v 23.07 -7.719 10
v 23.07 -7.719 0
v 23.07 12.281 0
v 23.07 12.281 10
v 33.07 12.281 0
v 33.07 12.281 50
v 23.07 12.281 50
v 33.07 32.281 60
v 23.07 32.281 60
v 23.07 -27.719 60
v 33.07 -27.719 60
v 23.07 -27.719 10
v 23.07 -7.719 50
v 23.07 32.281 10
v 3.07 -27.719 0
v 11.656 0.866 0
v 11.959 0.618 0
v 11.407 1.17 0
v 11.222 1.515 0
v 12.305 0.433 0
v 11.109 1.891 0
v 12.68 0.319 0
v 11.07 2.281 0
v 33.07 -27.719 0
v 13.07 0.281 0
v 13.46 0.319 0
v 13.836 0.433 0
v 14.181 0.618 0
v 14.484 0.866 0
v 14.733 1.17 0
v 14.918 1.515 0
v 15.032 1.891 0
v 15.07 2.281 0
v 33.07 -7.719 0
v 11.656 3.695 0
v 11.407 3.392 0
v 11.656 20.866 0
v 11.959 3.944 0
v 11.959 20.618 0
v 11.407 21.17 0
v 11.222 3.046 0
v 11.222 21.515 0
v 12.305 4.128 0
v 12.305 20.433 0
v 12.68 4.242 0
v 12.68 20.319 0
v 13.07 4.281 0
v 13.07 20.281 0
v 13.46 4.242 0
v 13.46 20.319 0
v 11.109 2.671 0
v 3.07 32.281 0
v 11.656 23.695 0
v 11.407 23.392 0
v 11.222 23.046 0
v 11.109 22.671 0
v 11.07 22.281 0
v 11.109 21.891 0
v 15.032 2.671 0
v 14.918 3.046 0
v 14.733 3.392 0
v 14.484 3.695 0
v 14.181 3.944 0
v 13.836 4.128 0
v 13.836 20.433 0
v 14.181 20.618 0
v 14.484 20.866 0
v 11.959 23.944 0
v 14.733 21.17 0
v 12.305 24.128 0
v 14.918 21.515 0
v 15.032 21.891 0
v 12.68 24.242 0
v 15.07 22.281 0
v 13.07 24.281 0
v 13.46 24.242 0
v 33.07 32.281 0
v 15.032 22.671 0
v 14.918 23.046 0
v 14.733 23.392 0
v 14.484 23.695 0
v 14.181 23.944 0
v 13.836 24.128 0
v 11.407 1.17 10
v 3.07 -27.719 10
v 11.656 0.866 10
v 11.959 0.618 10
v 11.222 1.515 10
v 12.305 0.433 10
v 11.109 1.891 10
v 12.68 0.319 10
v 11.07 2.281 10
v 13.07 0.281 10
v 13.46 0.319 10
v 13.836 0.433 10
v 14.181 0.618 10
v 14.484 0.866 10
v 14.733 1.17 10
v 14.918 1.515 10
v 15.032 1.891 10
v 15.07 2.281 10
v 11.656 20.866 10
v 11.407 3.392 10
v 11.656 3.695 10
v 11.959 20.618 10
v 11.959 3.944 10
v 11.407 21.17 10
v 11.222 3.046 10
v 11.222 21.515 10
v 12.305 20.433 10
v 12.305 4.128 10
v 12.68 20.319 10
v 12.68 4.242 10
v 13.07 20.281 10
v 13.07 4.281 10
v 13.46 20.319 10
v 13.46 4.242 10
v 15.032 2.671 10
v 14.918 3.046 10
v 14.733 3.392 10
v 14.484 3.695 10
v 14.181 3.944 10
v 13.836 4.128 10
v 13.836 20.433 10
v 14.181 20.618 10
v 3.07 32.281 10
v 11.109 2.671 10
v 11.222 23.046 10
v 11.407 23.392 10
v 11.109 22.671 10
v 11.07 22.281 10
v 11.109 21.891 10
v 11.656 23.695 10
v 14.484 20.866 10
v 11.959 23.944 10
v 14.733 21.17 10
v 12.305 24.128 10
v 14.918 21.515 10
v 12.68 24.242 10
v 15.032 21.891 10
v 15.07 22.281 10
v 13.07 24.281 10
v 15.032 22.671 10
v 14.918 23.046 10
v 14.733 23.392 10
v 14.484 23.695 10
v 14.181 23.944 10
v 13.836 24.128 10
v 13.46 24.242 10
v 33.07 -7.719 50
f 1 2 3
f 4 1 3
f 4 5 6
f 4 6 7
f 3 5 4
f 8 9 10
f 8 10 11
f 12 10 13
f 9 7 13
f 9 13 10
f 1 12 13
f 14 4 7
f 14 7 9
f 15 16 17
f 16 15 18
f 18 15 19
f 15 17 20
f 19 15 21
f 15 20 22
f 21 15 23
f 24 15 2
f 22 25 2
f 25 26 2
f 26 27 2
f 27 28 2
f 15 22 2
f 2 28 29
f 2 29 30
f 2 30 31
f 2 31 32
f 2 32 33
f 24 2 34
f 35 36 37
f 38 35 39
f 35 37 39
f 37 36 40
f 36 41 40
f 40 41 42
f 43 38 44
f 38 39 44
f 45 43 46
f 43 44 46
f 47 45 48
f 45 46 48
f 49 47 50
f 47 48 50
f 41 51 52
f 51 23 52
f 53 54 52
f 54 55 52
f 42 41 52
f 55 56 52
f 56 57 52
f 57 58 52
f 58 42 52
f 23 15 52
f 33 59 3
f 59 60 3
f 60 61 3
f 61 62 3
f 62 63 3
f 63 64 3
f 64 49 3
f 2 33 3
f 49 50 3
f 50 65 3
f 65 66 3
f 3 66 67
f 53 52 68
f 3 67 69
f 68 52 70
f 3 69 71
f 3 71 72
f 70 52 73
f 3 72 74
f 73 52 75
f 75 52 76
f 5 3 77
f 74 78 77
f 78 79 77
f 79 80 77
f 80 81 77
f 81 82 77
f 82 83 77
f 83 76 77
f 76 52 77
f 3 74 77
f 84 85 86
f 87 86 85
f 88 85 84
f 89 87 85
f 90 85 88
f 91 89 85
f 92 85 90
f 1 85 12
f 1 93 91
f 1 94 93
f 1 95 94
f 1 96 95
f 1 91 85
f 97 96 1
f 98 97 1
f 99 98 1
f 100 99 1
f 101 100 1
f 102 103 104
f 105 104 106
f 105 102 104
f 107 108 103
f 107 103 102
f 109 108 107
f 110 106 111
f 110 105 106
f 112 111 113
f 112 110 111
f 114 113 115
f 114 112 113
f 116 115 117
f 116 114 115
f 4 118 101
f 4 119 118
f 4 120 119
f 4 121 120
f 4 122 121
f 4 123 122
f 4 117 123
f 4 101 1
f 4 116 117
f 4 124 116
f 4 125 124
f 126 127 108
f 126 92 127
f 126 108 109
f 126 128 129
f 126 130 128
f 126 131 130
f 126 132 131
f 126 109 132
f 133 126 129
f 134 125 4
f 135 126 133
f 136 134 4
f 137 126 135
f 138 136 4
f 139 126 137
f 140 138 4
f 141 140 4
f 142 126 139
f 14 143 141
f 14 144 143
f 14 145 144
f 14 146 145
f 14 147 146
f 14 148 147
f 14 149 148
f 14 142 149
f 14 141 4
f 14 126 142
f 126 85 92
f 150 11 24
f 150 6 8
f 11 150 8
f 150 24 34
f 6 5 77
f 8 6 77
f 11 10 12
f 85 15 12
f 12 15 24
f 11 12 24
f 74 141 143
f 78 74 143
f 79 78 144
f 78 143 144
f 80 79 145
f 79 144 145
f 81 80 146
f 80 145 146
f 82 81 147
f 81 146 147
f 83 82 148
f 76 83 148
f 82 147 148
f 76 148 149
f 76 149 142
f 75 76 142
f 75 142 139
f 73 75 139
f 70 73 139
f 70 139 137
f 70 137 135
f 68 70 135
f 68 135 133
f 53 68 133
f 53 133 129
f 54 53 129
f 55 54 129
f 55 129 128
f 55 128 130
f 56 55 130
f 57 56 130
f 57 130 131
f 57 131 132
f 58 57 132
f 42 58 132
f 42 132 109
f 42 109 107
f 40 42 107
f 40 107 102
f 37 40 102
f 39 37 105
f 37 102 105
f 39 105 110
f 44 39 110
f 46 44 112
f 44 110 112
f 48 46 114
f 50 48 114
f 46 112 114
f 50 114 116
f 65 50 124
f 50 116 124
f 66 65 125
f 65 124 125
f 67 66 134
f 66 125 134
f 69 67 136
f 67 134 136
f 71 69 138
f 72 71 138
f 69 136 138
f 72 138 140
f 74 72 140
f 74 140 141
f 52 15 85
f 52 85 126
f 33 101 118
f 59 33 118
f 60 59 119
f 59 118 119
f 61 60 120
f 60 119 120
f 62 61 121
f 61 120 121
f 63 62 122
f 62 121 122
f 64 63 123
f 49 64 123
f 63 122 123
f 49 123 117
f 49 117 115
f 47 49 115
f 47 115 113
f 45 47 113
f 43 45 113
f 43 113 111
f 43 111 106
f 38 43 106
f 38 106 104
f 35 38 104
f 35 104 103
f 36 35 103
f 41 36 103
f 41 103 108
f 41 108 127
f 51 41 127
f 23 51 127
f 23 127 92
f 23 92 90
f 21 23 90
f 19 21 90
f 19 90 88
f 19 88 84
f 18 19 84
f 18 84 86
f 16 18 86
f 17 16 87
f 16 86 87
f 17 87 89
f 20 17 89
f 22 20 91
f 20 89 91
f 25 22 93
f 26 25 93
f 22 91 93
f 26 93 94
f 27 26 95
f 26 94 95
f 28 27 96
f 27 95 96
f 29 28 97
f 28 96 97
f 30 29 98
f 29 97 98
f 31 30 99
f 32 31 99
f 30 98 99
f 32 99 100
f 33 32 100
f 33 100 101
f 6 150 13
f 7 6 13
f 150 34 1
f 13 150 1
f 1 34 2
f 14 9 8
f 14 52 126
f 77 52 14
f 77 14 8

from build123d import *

# Parameters (mm, degrees)
SKETCH1_W           = 30
SKETCH1_H           = 60
BOSS_EXTRUDE1_DEPTH = 10
SKETCH2_W           = 10
SKETCH2_H           = 60
BOSS_EXTRUDE2_DEPTH = 50
SKETCH3_R           = 2
CUT_EXTRUDE1_DEPTH  = 50
SKETCH4_W           = 10
SKETCH4_H           = 20
CUT_EXTRUDE2_DEPTH  = 50


with BuildPart() as part:
    # Sketch1 → Boss-Extrude1 (new body)
    with BuildSketch(Plane.XY):
        with Locations((18.070175439, 2.280701754)):
            Rectangle(SKETCH1_W, SKETCH1_H)
    extrude(amount=BOSS_EXTRUDE1_DEPTH)

    # Sketch2 → Boss-Extrude2 (add)
    with BuildSketch(Plane.XY.offset(10)):
        with Locations((28.070175439, 2.280701754)):
            Rectangle(SKETCH2_W, SKETCH2_H)
    extrude(amount=BOSS_EXTRUDE2_DEPTH)

    # Sketch3 → Cut-Extrude1 (cut)
    with BuildSketch(Plane.XY.offset(10)):
        with Locations((13.070175439, 22.280701754)):
            Circle(SKETCH3_R)
        with Locations((13.070175439, 2.280701754)):
            Circle(SKETCH3_R)
    extrude(amount=-CUT_EXTRUDE1_DEPTH, mode=Mode.SUBTRACT)

    # Sketch4 → Cut-Extrude2 (cut)
    with BuildSketch(Plane(origin=(0, 0, 0), x_dir=(-1, 0, 0), z_dir=(0, 0, -1))):
        with Locations((-28.070175439, 2.280701754)):
            Rectangle(SKETCH4_W, SKETCH4_H)
    extrude(amount=-CUT_EXTRUDE2_DEPTH, mode=Mode.SUBTRACT)


solid = part.part
